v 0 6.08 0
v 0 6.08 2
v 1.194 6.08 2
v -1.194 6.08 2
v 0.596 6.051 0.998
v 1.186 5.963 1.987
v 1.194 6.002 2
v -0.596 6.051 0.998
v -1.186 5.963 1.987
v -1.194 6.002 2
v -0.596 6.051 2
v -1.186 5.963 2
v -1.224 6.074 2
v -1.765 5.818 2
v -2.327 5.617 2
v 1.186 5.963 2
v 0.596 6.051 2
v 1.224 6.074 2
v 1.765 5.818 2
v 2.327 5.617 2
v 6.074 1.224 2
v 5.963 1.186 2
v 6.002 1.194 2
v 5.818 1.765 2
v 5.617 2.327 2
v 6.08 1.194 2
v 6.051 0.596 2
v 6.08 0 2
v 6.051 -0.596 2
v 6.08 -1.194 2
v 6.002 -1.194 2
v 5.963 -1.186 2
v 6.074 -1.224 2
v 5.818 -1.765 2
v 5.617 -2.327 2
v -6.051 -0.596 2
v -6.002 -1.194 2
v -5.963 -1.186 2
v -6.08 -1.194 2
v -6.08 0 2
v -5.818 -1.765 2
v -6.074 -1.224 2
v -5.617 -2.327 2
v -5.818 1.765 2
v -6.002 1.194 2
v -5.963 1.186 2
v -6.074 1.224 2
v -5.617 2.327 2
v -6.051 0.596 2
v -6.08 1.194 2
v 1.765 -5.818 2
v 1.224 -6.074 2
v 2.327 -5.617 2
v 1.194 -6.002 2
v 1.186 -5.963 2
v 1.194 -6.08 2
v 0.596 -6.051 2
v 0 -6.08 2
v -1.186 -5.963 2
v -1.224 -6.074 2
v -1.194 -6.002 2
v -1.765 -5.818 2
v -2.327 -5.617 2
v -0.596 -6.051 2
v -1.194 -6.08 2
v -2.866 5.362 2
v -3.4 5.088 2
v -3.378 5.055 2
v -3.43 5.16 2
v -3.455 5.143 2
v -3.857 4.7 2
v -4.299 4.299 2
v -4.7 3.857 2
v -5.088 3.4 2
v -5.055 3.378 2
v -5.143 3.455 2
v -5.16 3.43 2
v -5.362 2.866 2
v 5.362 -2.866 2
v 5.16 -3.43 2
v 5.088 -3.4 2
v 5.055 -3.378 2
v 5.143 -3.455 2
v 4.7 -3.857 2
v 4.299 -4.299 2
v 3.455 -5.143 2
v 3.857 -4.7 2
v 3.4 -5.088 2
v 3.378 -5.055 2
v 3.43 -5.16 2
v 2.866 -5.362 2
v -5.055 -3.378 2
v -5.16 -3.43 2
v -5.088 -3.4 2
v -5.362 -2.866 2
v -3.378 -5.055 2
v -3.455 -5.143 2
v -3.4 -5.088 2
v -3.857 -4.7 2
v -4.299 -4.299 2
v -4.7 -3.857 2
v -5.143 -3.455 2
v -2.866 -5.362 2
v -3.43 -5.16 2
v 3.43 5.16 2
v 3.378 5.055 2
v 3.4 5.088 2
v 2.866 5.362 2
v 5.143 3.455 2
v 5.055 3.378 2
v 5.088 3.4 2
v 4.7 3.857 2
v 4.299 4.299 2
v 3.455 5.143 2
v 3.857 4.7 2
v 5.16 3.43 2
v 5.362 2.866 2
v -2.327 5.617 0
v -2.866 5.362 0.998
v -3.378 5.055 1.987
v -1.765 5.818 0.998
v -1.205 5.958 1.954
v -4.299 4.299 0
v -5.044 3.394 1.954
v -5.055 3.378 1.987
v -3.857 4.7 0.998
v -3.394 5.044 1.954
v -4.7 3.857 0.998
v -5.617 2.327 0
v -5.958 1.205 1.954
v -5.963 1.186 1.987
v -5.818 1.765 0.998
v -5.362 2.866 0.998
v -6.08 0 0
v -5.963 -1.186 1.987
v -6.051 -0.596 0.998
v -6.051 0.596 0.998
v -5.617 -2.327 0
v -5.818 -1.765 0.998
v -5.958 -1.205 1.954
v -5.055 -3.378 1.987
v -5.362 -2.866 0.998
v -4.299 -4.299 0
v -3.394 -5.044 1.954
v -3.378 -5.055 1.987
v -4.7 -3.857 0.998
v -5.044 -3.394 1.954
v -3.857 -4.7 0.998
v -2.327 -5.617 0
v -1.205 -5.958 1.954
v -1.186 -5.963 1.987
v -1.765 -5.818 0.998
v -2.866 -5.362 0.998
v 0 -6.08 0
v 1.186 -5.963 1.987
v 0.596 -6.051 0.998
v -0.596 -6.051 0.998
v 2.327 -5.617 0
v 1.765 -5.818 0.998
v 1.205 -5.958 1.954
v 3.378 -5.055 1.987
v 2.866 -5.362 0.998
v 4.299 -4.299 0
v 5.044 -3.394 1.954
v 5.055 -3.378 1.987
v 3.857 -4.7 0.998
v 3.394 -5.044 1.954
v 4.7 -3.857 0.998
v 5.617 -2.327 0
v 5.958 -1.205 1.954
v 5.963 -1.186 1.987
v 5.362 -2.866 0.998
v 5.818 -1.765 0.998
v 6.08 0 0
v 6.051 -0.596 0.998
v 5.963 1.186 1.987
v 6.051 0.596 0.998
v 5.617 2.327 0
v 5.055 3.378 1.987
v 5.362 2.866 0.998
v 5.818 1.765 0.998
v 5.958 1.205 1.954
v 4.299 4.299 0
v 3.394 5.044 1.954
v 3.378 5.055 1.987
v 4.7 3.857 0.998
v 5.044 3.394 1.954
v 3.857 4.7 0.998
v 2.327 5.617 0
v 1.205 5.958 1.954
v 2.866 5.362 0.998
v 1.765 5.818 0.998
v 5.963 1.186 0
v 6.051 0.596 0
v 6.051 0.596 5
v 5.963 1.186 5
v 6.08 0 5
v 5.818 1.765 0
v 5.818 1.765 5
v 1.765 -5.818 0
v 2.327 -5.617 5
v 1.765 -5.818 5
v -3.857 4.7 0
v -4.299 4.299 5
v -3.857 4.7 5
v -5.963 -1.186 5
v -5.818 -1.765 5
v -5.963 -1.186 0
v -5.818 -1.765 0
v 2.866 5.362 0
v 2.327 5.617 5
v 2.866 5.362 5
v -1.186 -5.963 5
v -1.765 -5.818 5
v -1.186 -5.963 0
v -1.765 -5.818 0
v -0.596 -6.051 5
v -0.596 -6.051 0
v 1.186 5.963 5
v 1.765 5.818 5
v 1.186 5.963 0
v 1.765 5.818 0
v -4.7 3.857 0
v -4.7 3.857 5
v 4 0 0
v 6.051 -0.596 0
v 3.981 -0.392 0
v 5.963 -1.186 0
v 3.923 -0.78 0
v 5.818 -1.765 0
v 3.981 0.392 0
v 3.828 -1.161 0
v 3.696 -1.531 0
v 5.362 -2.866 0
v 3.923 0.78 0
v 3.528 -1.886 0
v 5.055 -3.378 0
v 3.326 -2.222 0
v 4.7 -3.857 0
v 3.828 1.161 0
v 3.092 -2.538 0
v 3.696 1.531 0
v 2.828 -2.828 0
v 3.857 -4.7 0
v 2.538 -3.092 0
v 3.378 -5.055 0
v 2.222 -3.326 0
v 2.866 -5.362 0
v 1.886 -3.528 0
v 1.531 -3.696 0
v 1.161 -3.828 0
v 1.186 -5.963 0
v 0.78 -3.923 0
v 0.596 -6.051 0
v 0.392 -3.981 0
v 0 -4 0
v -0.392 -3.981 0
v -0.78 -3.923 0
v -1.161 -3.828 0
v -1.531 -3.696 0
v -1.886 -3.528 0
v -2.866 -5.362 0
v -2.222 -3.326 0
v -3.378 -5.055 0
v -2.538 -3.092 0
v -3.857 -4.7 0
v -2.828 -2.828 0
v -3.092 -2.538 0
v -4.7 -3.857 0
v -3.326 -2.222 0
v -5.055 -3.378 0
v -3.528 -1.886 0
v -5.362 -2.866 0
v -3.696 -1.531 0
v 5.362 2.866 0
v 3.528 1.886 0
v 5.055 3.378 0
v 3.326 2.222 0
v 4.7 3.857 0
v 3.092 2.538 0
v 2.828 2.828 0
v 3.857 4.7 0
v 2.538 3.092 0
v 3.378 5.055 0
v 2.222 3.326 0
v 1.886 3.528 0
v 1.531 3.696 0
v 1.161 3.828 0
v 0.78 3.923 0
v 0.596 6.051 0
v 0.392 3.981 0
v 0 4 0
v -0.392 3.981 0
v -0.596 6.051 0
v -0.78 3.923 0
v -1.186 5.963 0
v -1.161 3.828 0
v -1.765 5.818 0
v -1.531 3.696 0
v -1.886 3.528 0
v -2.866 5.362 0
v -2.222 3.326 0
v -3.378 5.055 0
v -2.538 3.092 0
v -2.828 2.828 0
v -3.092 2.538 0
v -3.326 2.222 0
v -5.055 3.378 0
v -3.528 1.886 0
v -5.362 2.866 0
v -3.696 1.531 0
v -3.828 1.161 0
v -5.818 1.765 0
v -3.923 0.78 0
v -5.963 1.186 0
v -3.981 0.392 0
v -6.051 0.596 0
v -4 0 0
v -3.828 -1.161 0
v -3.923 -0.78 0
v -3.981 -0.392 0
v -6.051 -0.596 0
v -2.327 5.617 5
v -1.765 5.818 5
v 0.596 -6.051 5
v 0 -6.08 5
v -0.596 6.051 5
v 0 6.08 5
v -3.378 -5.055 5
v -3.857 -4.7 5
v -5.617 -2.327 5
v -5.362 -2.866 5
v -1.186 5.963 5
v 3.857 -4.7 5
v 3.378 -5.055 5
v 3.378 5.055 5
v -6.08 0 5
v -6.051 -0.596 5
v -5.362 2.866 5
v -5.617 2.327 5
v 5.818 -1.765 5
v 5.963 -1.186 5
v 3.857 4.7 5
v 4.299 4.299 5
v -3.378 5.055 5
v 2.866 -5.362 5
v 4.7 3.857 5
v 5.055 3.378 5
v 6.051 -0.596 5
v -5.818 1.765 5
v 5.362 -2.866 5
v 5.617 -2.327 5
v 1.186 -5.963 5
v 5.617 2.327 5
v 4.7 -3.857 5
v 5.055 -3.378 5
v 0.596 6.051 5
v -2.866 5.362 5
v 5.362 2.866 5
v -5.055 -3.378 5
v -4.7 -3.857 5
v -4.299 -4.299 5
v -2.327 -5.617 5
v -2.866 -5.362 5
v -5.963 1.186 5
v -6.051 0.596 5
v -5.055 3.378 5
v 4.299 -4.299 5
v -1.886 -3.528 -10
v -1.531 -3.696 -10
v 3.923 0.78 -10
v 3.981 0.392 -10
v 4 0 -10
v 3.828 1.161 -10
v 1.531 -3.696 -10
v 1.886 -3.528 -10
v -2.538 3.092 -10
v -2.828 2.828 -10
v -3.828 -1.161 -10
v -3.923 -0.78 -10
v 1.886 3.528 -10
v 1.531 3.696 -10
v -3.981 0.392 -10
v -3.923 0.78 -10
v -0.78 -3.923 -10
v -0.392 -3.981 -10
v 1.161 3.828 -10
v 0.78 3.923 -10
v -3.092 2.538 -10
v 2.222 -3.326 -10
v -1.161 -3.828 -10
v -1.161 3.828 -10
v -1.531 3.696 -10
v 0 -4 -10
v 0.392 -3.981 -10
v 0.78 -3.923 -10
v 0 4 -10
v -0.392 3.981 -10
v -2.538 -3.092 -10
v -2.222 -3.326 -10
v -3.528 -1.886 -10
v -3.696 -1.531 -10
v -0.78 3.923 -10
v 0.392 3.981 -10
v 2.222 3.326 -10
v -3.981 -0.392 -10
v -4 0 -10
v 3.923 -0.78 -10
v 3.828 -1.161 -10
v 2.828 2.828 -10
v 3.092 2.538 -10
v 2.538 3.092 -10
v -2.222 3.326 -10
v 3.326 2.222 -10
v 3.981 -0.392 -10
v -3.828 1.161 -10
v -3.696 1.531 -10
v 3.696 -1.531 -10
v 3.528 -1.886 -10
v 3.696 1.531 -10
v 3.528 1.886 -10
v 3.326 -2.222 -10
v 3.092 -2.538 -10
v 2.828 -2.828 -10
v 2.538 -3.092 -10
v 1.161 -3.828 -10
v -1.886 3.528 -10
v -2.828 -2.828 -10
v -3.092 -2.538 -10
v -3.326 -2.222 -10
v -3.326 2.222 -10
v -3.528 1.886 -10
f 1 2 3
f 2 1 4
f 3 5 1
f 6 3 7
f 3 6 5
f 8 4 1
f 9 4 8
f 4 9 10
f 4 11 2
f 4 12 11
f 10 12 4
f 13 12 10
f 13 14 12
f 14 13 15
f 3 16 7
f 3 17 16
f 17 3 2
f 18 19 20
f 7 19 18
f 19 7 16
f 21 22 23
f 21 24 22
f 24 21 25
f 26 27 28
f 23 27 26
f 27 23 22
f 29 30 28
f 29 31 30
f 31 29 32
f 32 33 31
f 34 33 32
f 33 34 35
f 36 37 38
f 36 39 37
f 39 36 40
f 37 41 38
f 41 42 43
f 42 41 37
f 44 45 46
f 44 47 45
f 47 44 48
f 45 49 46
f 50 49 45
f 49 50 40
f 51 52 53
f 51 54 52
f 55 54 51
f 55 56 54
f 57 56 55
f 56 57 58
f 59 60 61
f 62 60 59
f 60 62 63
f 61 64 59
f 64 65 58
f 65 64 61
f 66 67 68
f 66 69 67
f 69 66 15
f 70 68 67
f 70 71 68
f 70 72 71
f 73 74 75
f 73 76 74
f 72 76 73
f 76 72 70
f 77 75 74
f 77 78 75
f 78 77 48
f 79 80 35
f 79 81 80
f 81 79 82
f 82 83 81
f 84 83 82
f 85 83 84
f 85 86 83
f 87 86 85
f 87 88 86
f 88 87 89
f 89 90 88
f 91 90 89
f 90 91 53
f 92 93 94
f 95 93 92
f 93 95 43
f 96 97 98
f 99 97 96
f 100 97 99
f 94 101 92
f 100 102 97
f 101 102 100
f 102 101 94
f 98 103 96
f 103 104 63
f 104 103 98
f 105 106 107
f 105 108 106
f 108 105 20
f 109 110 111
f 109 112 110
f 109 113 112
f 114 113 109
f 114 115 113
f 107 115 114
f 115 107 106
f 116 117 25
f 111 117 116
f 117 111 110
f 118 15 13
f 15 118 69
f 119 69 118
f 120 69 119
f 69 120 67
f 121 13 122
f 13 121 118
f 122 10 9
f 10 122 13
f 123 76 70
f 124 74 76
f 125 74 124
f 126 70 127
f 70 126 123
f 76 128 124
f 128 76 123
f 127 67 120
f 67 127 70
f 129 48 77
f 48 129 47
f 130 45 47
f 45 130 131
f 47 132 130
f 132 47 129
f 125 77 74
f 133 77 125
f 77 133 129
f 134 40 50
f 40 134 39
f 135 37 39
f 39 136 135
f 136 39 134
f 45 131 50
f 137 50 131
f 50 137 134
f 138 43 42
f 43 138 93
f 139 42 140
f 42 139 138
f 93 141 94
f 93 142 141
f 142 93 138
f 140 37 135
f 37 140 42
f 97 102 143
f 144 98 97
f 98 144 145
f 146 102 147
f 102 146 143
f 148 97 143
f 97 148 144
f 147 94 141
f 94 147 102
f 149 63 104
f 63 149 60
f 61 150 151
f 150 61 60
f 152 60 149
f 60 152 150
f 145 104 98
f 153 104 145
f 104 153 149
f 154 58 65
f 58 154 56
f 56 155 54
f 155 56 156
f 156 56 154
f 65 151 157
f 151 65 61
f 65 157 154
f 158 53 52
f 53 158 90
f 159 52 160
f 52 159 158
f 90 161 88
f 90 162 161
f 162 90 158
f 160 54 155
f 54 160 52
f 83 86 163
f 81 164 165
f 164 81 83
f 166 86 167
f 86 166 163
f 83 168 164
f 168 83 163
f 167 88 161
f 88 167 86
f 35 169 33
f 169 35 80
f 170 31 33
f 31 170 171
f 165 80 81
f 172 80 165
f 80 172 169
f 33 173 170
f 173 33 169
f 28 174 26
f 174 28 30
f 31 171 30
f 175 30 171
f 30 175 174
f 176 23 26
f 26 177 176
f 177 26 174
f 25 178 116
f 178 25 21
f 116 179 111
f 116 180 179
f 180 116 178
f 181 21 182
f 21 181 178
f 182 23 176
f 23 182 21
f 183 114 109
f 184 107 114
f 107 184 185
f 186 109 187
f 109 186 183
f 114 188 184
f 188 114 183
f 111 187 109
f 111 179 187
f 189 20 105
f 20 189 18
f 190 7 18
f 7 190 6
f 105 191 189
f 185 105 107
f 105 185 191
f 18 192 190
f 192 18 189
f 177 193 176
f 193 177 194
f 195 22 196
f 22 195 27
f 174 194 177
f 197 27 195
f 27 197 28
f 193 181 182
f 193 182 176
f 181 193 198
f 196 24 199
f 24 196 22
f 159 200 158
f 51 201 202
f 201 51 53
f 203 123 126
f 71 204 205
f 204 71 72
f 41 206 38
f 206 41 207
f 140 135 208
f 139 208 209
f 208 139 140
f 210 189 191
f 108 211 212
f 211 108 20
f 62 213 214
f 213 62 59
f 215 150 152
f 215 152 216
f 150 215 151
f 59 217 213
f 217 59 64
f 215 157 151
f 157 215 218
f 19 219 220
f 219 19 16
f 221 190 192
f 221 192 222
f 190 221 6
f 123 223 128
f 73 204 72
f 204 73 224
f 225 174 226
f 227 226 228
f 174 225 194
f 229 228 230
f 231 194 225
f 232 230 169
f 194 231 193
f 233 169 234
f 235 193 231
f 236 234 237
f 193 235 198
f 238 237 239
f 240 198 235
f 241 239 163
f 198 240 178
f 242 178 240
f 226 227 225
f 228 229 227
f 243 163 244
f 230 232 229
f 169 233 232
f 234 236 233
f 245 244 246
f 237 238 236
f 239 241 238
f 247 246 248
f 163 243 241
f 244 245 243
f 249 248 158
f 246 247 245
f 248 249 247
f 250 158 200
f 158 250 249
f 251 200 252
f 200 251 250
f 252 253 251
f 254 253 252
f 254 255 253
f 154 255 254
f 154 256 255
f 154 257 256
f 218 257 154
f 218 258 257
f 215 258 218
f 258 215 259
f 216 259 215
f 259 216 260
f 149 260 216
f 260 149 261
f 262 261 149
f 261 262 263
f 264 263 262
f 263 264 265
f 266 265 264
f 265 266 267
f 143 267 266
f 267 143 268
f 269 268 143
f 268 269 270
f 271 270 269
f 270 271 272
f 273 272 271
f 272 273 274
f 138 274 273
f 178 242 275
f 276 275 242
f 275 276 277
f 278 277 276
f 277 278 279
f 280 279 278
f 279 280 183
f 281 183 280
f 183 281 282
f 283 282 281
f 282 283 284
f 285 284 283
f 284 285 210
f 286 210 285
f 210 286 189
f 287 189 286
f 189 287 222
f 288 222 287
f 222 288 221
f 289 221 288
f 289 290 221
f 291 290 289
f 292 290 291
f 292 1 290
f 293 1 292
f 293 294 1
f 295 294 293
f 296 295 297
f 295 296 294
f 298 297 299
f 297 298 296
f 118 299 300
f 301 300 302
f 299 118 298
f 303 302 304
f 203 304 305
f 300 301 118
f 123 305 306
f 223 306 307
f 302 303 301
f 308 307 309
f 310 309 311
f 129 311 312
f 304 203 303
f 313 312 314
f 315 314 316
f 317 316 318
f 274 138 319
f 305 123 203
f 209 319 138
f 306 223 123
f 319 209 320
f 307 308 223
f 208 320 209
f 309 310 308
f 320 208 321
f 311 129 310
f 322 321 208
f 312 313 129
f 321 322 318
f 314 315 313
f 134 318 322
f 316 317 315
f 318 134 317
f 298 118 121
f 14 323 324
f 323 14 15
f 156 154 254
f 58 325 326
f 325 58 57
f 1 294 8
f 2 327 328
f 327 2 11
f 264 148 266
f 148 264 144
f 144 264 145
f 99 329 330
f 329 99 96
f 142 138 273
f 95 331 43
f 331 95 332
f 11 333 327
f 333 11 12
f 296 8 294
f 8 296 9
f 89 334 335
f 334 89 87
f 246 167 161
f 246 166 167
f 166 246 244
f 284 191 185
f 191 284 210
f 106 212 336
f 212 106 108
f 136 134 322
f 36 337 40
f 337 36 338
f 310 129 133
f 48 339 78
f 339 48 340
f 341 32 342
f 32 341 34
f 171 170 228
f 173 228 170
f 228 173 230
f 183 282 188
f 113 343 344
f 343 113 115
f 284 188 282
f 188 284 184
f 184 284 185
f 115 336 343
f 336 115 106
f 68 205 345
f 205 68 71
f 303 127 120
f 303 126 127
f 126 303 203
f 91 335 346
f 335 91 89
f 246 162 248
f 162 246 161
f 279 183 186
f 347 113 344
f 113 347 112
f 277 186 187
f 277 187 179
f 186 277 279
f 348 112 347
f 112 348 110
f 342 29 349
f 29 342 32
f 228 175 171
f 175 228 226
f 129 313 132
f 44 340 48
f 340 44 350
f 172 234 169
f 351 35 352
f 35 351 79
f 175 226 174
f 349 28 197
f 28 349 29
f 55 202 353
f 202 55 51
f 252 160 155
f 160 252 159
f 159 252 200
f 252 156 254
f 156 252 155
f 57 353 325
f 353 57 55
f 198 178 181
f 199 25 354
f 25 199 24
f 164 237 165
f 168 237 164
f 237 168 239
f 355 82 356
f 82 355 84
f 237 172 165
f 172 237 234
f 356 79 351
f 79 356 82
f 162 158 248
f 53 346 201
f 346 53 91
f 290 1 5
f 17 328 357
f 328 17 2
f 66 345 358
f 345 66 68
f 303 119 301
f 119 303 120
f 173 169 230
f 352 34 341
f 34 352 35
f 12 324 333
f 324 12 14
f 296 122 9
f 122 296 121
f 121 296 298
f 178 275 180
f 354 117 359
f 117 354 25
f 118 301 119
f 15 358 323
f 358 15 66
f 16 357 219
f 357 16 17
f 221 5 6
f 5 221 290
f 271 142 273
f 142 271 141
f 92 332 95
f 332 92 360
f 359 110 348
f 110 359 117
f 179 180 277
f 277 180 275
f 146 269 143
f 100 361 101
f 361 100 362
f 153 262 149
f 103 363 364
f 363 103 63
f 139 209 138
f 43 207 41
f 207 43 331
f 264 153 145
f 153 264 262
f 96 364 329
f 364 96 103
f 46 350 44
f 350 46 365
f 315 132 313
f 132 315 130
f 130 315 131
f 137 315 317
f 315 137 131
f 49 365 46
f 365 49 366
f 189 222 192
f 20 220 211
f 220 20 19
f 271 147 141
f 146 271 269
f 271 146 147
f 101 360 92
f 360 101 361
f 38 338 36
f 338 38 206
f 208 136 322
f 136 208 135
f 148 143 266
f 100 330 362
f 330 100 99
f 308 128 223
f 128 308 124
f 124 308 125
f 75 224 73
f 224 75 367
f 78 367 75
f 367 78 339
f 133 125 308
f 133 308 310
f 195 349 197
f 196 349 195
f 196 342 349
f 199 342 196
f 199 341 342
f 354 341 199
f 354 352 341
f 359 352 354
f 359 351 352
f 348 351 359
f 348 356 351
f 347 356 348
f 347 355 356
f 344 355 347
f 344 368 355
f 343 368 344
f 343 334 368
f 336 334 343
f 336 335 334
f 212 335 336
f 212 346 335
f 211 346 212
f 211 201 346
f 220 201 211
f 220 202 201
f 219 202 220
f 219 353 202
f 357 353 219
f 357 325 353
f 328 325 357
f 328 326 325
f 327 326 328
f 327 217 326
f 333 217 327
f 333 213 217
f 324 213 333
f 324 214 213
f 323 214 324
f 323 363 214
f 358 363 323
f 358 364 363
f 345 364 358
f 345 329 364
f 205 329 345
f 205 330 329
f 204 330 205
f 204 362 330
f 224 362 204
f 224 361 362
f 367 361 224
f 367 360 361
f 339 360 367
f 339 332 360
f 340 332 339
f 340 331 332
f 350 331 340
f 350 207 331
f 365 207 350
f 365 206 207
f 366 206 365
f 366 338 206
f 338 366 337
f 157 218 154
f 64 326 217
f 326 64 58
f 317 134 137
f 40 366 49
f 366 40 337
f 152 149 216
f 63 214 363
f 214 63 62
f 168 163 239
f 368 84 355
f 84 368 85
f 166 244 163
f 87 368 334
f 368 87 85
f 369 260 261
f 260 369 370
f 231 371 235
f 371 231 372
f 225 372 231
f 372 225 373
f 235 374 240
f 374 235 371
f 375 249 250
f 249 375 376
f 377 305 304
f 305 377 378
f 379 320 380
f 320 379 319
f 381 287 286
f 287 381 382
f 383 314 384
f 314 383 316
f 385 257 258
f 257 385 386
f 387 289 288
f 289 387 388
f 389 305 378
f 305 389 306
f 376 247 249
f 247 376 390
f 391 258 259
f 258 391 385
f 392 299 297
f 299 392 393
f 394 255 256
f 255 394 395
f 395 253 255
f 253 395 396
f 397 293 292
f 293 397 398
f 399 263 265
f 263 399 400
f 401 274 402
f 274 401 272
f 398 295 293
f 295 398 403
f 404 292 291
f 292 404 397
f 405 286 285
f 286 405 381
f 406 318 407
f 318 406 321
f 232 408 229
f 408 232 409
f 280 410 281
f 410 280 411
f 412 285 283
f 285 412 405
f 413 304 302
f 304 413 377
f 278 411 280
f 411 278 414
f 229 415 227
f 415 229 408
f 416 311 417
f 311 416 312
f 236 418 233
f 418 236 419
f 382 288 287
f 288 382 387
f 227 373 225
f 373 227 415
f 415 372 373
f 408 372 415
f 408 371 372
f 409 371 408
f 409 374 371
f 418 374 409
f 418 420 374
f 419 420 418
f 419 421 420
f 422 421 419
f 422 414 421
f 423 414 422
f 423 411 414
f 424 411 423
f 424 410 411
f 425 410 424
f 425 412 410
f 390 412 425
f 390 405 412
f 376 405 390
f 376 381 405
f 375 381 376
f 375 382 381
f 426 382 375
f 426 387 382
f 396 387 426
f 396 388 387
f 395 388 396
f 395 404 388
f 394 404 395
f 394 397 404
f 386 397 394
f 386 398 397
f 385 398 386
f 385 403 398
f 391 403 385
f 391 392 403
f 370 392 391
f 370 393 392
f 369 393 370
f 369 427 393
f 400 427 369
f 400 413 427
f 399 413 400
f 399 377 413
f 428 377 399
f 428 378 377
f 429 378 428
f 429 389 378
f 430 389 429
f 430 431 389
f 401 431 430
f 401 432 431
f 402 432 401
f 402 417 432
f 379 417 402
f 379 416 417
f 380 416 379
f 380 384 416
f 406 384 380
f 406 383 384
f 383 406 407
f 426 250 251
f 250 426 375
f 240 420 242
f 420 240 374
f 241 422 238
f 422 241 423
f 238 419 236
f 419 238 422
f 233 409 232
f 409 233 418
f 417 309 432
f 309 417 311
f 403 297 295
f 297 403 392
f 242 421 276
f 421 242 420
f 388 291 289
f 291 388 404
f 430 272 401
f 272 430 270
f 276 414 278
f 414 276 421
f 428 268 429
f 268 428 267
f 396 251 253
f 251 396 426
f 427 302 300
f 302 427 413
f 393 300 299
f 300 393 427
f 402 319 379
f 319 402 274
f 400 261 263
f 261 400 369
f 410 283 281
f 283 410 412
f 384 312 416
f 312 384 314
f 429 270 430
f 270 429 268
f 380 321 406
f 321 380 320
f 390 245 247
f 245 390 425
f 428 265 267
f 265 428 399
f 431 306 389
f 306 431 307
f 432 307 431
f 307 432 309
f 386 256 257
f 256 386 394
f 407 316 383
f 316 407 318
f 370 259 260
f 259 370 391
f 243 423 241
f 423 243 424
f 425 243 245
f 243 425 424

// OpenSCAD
module timing_pulley(teeth=16, pitch_diameter=12.16, belt_width=5, hub_diameter=8, hub_height=10) {
    tooth_height = 2;
    tooth_width = pitch_diameter * PI / teeth;
    pulley_height = belt_width + hub_height;
    
    module tooth() {
        translate([0, pitch_diameter / 2, 0])
        rotate([90, 0, 0])
        linear_extrude(height=belt_width)
        polygon(points=[[0, 0], [tooth_width / 2, tooth_height], [-tooth_width / 2, tooth_height]]);
    }
    
    union() {
        // Create the main pulley body
        cylinder(d=pitch_diameter, h=belt_width, $fn=64);
        
        // Add teeth around the pulley
        for (i = [0:teeth-1]) {
            rotate([0, 0, i * 360 / teeth])
            tooth();
        }
        
        // Add the hub
        translate([0, 0, -hub_height])
        cylinder(d=hub_diameter, h=pulley_height, $fn=64);
    }
}

timing_pulley();
